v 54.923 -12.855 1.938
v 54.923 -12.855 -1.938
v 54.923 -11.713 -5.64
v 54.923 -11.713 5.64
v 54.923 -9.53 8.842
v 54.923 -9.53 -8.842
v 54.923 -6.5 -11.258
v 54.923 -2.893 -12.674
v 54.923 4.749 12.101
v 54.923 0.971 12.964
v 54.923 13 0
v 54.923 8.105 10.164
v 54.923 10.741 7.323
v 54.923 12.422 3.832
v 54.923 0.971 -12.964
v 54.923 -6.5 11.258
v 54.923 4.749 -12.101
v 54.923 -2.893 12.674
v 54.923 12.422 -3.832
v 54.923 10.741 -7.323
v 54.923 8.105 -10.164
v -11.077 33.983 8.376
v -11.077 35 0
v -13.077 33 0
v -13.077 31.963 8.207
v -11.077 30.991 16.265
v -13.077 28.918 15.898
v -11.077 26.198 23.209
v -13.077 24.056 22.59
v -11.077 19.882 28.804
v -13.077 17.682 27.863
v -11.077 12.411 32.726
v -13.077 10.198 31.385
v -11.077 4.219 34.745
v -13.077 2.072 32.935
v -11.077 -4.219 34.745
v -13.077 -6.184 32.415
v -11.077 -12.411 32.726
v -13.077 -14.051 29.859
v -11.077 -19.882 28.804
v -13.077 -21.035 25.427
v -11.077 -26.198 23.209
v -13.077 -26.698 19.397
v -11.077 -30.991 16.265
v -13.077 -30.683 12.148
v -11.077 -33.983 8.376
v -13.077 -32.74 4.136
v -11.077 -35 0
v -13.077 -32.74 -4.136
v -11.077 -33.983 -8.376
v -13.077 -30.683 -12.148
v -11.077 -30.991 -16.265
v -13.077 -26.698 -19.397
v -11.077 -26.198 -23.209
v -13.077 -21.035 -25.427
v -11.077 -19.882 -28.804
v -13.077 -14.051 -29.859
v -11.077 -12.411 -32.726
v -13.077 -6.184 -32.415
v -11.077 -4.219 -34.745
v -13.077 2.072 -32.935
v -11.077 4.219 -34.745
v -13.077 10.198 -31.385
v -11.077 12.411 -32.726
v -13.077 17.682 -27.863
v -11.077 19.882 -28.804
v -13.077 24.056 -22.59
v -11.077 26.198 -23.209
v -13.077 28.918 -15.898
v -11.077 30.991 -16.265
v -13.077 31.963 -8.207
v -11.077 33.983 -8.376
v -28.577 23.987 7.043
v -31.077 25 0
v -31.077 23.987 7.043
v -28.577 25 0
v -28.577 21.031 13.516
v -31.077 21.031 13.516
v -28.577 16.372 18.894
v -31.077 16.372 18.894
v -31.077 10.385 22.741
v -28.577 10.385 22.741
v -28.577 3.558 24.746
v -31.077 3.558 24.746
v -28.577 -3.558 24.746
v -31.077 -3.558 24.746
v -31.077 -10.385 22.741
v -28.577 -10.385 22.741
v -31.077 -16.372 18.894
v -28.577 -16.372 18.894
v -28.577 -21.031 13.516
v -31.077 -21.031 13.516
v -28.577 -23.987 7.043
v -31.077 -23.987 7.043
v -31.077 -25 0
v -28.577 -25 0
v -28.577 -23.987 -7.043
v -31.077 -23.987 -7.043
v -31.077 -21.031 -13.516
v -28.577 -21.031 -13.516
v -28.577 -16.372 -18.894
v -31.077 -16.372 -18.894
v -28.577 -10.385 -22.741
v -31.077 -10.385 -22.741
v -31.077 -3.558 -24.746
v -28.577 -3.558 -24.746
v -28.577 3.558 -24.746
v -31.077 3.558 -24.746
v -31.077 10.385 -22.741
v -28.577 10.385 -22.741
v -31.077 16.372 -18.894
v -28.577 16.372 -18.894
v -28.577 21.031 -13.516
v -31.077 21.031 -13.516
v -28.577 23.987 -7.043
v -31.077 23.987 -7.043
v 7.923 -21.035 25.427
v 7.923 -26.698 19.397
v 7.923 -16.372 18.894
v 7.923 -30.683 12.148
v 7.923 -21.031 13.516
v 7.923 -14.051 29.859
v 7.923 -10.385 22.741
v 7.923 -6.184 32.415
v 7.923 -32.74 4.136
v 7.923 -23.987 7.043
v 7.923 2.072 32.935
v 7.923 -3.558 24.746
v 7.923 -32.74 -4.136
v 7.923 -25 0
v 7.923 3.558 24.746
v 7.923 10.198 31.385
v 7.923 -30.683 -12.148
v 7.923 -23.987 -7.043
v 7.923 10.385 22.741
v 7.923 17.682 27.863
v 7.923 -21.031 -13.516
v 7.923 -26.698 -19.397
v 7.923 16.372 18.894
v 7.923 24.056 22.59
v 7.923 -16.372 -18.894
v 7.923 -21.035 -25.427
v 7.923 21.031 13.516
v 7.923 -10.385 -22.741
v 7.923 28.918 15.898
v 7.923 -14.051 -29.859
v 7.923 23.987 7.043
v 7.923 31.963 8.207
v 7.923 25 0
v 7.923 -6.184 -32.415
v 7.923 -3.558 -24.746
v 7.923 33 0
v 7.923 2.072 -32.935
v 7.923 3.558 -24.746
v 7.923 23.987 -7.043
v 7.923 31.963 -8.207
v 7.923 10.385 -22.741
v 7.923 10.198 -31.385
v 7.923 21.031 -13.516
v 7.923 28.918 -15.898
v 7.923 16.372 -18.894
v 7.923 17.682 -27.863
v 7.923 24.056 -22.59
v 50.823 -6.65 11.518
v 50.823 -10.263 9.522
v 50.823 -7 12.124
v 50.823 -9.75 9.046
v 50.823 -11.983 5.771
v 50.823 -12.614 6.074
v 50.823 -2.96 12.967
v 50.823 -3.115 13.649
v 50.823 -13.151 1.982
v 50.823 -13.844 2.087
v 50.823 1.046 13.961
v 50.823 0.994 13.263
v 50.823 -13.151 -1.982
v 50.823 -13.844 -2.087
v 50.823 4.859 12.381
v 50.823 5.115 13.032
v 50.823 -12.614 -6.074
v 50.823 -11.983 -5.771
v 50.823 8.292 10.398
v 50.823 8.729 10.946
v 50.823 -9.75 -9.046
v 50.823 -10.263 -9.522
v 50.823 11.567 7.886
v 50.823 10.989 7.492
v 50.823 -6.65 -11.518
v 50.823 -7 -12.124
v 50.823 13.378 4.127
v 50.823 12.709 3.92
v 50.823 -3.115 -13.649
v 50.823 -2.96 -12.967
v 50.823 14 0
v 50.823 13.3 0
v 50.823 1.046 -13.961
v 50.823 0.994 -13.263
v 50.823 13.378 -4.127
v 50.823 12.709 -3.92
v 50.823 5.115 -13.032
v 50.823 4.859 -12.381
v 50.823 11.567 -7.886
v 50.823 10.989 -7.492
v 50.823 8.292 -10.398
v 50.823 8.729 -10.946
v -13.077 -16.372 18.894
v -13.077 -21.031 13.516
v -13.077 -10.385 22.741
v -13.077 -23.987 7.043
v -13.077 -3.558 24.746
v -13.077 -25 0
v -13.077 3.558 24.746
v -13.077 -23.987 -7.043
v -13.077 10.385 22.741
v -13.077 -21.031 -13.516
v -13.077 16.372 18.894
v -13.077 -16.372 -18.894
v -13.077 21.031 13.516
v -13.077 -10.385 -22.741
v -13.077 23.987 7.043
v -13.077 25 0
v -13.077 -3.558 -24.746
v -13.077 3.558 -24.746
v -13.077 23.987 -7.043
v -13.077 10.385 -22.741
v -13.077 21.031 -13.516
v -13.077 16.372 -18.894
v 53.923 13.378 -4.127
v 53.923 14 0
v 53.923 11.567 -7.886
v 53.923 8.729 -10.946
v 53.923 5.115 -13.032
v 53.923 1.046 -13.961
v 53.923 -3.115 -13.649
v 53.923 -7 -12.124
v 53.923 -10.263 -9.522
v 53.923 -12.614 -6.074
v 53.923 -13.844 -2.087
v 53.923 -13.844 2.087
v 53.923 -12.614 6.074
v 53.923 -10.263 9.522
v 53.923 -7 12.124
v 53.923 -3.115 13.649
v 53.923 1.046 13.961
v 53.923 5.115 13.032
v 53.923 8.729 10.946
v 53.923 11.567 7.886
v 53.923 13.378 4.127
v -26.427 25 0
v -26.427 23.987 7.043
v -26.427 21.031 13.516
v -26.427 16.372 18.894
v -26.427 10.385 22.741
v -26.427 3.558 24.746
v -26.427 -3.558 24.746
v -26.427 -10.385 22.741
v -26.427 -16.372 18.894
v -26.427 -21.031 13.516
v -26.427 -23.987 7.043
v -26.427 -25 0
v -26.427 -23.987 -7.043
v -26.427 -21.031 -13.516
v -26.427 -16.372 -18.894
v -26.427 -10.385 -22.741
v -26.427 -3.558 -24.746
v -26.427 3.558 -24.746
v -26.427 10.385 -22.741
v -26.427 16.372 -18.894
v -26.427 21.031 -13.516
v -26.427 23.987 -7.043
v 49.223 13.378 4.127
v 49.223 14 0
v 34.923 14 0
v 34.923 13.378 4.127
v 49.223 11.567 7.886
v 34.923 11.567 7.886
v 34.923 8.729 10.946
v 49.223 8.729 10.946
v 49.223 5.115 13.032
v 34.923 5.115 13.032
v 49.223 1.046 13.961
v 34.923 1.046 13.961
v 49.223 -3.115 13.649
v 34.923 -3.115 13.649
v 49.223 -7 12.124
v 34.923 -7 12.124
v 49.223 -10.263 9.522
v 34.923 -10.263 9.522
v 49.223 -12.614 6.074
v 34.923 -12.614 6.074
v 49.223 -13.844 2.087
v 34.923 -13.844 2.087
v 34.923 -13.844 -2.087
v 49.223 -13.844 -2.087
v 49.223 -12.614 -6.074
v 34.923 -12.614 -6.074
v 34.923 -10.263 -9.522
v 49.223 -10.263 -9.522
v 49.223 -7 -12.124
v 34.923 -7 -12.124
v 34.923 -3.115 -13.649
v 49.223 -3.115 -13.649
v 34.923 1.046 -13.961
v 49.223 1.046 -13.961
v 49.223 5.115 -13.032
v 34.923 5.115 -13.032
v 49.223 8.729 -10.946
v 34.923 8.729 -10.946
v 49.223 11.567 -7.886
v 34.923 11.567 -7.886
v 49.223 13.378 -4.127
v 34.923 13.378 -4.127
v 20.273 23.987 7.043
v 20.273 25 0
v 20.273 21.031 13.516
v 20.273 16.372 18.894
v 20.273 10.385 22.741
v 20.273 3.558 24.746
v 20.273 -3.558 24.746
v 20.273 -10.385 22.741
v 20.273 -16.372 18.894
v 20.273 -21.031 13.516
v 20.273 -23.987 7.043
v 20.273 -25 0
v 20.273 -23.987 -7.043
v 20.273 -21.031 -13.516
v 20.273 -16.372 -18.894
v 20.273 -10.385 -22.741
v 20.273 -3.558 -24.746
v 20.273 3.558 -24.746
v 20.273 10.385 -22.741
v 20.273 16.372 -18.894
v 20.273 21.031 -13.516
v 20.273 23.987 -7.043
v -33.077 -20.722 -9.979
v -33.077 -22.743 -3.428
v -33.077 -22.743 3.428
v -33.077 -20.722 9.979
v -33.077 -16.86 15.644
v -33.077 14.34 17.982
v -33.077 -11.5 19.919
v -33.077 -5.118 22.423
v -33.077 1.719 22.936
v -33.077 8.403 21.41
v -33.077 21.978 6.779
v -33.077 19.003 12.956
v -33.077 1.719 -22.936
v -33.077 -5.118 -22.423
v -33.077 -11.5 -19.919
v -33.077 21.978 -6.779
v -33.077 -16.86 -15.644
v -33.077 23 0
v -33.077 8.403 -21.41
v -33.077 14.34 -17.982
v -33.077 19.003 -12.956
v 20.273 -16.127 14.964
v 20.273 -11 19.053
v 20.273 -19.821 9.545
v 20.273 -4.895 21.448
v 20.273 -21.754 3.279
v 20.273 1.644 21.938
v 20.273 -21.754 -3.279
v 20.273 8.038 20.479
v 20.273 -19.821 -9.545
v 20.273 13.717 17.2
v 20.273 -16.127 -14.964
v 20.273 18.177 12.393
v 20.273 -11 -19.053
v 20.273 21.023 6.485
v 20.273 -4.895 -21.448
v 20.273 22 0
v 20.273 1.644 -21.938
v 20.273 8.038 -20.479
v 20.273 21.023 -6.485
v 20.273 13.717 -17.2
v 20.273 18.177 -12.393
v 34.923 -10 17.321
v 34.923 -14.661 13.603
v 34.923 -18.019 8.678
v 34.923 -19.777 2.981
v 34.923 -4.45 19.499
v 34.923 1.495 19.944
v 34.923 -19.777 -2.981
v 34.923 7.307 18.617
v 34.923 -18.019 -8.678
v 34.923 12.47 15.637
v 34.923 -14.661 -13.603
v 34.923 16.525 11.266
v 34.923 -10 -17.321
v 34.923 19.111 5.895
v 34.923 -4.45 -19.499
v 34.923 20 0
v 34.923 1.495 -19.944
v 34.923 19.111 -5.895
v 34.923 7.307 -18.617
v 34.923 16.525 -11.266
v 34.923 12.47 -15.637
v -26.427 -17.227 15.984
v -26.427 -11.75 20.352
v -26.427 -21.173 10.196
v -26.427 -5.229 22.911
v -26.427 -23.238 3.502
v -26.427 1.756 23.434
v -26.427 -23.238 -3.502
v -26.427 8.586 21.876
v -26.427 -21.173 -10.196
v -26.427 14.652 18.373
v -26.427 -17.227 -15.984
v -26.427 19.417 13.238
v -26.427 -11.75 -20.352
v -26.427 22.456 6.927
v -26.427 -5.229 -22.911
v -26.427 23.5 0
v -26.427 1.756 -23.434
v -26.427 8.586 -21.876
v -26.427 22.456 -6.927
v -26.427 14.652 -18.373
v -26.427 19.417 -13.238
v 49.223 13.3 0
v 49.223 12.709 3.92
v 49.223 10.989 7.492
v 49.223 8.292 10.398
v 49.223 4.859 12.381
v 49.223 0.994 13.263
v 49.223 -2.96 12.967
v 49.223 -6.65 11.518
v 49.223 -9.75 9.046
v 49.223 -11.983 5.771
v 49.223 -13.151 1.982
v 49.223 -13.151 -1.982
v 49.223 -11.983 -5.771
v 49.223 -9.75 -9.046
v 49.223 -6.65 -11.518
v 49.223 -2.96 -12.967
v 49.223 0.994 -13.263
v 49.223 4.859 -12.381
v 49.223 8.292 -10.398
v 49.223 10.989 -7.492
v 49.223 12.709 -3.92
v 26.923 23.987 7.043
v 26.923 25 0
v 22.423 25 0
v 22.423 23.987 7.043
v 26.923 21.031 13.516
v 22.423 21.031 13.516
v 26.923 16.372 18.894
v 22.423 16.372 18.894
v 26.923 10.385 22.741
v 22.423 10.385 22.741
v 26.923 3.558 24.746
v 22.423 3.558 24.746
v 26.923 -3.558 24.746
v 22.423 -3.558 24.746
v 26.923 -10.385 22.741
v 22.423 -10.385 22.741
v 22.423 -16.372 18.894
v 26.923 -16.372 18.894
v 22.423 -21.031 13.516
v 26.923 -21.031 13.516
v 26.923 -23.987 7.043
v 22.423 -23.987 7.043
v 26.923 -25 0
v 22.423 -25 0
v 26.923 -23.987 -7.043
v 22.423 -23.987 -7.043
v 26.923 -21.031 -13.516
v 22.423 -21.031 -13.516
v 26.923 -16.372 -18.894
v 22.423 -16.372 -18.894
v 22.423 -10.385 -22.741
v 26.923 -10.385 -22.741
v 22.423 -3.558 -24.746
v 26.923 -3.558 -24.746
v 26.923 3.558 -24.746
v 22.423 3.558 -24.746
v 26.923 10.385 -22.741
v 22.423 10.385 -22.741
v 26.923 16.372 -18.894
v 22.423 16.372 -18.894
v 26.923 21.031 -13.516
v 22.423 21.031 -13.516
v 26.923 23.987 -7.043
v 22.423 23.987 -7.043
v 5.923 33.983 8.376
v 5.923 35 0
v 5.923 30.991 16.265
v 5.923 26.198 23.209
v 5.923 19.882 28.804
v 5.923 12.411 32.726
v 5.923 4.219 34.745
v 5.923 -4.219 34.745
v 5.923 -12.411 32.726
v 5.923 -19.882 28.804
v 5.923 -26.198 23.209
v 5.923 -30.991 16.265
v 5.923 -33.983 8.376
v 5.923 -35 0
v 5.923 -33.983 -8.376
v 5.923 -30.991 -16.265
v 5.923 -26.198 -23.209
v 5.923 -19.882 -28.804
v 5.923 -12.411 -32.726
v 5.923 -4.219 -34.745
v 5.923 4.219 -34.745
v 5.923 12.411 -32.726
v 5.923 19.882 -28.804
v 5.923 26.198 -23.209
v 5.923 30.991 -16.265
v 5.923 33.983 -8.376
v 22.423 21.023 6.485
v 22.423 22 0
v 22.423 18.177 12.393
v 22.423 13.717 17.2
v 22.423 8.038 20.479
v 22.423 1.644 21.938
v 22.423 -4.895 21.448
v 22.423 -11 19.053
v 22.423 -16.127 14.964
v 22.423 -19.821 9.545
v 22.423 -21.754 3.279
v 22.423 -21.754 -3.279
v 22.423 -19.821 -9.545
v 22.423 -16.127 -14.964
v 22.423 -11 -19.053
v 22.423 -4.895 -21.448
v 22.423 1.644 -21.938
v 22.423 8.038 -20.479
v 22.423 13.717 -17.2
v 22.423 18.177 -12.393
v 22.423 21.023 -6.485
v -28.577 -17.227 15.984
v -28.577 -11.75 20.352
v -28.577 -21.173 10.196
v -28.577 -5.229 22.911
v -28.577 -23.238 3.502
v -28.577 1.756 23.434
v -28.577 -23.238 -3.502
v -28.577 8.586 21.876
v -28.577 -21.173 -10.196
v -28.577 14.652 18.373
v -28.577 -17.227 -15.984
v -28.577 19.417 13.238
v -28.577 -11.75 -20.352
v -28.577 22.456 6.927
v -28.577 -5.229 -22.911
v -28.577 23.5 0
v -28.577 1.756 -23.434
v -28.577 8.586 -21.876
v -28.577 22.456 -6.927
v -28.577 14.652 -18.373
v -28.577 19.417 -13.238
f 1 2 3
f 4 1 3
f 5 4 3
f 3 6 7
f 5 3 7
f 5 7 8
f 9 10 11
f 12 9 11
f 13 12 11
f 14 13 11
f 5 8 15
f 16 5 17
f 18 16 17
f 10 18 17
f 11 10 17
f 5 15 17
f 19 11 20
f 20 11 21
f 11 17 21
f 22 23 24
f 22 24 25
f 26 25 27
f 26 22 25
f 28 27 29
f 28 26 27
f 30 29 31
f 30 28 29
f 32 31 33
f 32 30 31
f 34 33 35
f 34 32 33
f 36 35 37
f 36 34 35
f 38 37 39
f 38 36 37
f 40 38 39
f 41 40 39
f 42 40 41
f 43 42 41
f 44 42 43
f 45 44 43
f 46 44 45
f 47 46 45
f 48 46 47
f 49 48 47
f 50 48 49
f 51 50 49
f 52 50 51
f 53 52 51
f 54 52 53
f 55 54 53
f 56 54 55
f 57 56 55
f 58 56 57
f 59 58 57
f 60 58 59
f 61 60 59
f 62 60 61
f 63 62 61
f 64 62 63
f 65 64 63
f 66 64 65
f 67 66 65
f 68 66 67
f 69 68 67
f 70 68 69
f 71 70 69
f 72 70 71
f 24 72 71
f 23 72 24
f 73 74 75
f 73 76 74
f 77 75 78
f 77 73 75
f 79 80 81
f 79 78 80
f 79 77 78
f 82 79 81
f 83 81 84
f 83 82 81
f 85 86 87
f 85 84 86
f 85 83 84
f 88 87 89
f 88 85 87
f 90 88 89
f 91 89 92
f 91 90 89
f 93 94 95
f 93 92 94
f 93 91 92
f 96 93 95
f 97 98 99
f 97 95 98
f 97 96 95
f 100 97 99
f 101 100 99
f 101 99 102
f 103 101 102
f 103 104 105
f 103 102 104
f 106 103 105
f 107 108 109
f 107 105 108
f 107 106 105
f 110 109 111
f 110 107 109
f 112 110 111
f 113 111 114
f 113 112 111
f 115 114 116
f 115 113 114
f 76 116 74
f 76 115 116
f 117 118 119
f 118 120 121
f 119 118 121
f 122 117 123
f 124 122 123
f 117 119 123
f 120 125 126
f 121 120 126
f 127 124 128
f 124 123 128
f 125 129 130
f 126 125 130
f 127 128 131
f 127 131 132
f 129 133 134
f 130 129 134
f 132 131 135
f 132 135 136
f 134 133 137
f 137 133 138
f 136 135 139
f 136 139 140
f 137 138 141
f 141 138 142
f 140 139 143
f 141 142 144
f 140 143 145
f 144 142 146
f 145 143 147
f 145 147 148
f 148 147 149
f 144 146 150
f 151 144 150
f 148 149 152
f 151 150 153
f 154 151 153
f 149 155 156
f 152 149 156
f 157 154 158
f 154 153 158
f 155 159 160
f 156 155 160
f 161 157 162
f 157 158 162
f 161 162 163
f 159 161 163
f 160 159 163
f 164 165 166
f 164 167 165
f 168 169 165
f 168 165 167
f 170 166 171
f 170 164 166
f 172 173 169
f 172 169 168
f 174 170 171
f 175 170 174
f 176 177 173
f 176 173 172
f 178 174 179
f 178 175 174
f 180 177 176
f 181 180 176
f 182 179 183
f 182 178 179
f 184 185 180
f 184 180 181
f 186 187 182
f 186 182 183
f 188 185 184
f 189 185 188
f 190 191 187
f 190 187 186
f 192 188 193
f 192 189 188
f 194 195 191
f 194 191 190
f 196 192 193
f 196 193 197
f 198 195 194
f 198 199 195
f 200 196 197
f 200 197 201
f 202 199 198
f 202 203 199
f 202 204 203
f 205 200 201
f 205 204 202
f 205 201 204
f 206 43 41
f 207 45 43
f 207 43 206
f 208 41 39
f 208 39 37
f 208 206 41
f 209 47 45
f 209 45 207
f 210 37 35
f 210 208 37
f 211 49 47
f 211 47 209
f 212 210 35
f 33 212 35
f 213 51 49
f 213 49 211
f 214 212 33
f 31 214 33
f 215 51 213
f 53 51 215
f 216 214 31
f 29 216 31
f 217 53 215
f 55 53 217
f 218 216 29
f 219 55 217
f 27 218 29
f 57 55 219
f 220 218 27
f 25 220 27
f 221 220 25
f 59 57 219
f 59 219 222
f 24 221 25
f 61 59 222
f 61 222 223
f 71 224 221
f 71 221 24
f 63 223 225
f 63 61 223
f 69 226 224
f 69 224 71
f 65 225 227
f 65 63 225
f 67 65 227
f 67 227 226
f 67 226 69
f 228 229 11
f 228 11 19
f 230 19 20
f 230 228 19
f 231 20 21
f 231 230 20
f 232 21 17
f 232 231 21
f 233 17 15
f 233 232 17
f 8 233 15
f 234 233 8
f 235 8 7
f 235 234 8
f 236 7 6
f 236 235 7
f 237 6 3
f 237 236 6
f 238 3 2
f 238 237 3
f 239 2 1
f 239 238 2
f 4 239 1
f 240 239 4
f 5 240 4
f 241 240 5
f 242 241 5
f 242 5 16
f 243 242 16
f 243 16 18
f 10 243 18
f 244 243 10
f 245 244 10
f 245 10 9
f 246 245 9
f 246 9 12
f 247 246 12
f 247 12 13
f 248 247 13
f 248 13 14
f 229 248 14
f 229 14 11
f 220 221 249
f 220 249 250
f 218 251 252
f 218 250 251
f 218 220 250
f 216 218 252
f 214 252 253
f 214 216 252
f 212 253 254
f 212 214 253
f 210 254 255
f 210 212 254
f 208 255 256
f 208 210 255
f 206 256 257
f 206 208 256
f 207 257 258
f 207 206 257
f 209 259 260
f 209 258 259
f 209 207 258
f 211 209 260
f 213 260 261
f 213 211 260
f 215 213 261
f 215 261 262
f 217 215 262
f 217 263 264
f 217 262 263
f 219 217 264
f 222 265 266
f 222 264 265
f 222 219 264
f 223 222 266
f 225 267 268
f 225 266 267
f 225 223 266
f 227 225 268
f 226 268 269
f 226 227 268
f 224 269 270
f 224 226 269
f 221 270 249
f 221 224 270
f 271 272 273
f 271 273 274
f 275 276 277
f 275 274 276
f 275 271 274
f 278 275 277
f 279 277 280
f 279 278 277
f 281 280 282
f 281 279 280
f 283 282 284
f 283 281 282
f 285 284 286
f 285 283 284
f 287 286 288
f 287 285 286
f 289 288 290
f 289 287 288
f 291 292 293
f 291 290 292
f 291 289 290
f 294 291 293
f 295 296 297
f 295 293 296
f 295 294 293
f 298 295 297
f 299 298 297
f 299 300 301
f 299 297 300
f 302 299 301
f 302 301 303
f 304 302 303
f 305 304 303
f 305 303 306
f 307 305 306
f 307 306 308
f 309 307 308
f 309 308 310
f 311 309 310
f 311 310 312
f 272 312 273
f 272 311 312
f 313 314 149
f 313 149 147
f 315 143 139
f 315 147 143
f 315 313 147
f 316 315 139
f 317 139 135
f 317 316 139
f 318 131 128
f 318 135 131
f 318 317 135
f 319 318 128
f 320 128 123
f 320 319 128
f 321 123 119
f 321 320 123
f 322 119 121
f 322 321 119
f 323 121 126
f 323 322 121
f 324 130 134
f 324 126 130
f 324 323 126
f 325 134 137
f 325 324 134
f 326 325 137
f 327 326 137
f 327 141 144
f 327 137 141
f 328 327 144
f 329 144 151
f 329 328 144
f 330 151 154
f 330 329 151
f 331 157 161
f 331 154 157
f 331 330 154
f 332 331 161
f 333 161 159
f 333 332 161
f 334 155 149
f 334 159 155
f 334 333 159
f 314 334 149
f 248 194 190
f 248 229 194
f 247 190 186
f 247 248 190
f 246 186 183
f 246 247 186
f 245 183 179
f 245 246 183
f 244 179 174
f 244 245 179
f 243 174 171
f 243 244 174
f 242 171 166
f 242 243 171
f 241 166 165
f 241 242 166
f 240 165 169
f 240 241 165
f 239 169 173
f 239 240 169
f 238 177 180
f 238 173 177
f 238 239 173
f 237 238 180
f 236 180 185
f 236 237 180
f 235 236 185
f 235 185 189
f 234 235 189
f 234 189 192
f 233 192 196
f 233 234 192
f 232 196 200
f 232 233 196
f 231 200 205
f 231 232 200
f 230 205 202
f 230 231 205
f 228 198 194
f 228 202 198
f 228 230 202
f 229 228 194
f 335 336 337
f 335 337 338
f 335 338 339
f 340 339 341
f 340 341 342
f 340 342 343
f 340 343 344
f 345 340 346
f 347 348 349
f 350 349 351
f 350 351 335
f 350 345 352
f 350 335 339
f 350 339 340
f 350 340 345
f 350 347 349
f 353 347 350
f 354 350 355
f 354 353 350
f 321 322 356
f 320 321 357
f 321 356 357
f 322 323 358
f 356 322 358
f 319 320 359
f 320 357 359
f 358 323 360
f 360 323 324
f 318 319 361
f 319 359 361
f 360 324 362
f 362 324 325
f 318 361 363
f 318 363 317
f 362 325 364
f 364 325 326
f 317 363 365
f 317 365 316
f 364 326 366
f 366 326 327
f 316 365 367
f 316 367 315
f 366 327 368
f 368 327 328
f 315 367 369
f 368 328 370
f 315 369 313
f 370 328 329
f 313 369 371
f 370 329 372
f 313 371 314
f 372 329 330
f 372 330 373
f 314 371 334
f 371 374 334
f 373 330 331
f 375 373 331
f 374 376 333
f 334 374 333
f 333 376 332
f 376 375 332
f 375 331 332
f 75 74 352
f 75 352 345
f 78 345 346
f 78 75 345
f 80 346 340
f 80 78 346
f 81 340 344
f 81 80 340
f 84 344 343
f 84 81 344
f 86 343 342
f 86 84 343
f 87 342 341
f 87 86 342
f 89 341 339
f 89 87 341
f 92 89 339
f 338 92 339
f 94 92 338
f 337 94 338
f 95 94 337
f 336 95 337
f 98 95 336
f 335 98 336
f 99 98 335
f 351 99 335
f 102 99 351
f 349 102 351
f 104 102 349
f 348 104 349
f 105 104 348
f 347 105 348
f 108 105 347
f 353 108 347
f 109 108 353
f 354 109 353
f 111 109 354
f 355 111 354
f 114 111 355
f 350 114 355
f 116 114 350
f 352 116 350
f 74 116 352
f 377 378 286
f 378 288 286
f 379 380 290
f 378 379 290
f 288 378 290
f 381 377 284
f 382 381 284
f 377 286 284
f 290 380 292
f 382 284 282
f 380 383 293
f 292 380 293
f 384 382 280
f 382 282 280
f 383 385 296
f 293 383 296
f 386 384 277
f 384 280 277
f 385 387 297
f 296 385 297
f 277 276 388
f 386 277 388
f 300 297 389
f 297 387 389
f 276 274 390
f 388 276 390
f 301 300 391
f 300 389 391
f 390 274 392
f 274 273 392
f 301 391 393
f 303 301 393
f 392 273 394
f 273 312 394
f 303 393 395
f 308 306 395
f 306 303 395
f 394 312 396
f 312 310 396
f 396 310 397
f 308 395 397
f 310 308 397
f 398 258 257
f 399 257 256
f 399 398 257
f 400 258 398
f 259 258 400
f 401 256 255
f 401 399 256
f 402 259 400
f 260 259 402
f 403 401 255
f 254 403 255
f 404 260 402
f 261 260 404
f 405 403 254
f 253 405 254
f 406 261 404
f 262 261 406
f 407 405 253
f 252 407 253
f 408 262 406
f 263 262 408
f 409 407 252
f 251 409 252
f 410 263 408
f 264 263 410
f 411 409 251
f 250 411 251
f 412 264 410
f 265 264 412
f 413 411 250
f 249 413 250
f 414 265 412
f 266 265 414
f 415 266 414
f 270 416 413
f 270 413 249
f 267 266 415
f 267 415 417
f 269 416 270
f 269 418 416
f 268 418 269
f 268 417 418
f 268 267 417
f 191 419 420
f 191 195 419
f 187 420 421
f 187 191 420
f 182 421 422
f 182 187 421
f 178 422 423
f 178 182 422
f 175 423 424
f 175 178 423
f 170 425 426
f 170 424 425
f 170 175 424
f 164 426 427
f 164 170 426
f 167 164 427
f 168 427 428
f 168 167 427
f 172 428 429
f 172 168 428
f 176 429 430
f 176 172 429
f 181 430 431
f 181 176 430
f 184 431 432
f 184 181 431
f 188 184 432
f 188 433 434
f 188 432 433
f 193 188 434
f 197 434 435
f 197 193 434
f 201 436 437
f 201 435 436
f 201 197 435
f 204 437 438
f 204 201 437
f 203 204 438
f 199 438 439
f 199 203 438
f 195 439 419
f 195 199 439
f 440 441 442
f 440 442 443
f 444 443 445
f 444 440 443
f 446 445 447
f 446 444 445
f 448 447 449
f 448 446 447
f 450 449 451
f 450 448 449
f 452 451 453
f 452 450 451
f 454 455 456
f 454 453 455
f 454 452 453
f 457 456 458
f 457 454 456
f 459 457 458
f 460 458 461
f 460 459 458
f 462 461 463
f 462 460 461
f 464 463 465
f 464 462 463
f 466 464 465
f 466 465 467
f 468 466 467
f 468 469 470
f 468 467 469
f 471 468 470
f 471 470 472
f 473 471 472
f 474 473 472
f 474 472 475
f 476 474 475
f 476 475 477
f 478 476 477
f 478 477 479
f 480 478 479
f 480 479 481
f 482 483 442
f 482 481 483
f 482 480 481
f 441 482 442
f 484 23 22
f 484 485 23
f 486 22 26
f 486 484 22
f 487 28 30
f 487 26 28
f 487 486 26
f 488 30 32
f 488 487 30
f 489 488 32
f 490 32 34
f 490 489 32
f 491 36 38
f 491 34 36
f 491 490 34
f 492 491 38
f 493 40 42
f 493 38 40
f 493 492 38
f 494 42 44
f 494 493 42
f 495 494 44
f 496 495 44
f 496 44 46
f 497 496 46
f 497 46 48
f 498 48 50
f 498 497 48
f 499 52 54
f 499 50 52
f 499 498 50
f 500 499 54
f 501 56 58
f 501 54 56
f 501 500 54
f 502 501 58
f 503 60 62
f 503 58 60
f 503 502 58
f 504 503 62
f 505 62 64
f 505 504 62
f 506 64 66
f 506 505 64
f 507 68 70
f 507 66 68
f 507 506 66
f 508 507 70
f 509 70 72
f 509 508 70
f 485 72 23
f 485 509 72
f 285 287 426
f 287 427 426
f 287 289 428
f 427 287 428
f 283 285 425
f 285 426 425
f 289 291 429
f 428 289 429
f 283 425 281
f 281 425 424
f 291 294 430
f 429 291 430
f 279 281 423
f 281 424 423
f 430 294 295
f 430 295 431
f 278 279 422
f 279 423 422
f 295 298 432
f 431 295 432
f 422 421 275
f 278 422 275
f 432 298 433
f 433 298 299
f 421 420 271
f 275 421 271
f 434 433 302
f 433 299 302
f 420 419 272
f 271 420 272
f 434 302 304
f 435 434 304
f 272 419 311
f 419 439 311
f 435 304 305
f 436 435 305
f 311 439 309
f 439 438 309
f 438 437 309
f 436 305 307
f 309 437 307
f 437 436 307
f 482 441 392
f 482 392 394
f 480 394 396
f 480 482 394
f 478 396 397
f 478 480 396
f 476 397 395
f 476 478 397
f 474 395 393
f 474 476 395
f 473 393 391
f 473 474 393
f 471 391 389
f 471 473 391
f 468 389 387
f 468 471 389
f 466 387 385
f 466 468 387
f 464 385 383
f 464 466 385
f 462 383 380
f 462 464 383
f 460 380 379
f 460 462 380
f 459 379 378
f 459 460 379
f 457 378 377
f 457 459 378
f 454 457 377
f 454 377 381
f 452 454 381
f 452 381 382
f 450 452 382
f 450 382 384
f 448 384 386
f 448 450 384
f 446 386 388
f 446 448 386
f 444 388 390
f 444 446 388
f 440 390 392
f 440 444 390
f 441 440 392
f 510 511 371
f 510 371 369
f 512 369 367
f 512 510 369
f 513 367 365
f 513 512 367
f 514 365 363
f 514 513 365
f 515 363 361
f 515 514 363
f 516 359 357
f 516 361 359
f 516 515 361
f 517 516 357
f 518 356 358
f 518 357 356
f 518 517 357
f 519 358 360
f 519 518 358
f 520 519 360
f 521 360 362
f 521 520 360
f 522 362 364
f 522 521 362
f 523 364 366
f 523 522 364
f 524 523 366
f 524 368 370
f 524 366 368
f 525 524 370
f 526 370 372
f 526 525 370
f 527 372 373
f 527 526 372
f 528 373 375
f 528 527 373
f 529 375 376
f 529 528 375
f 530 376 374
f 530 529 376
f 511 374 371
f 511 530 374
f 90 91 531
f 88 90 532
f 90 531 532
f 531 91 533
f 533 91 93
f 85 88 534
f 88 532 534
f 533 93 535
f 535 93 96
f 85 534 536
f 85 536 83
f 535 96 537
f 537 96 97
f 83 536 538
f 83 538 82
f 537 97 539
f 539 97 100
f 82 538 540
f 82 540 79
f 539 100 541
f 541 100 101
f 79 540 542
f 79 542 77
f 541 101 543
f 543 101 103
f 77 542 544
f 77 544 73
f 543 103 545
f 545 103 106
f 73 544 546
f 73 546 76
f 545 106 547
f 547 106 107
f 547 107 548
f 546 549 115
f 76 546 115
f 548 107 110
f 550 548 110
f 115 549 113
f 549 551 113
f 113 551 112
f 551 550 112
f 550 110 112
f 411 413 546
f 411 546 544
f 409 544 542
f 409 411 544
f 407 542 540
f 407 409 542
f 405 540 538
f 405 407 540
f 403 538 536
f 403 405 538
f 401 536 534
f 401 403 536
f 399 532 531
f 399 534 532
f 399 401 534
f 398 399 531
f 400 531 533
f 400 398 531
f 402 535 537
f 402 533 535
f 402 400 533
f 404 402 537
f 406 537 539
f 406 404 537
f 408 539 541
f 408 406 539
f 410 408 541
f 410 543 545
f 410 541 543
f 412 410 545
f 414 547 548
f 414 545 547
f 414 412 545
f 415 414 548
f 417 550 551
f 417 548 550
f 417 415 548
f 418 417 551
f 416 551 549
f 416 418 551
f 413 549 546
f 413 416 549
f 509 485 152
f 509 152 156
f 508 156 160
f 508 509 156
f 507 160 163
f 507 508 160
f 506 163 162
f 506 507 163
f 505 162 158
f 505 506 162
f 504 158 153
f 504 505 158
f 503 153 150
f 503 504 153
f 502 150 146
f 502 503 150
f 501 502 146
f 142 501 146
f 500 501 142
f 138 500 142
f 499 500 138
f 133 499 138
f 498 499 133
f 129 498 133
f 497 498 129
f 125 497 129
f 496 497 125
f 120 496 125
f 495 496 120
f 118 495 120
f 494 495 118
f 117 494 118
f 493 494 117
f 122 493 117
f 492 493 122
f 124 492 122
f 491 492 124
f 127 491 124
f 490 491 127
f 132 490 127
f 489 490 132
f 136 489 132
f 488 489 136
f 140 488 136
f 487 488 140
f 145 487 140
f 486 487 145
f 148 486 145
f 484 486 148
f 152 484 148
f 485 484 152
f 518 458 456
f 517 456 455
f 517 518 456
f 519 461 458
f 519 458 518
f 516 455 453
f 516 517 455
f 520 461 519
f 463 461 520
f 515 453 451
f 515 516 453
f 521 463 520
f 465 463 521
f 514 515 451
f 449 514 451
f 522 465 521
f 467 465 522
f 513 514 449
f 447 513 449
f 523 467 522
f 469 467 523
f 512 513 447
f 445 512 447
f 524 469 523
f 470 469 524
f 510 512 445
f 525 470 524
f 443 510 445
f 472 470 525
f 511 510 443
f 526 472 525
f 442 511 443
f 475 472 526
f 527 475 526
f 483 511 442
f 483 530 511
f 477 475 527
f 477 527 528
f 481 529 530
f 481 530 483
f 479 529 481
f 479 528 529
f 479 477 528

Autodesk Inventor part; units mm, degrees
ref_plane "YZ Plane" through (0, 0, 0) normal (1, 0, 0) x (0, 1, 0)
ref_plane "XZ Plane" through (0, 0, 0) normal (0, 1, 0) x (-1, 0, 0)
ref_plane "XY Plane" through (0, 0, 0) normal (0, 0, 1) x (1, 0, 0)
sketch "pierwsza_proba" plane through (0, 0, 0) normal (0, 0, 1) x (1, 0, 0)
  line L0 (-33.0769, 0) -> (-33.0769, 25)
  line L1 (-26.4269, 23.5) -> (-26.4269, 25)
  line L2 (-13.0769, 25) -> (-13.0769, 35)
  line L3 (-13.0769, 35) -> (7.9231, 35)
  line L4 (7.9231, 35) -> (7.9231, 25)
  line L5 (7.9231, 25) -> (20.2731, 25)
  line L6 (20.2731, 25) -> (20.2731, 22)
  line L7 (20.2731, 22) -> (22.4231, 22)
  line L8 (34.9231, 14) -> (49.2231, 14)
  line L9 (49.2231, 14) -> (49.2231, 13.3)
  line L10 (49.2231, 13.3) -> (50.8231, 13.3)
  line L11 (50.8231, 13.3) -> (50.8231, 14)
  line L12 (50.8231, 14) -> (54.9231, 14)
  line L13 (54.9231, 14) -> (54.9231, 0)
  line L14 (54.9231, 0) -> (-33.0769, 0)
  line L15 (-33.0769, 25) -> (-28.5769, 25)
  line L16 (-28.5769, 25) -> (-28.5769, 23.5)
  line L17 (-28.5769, 23.5) -> (-26.4269, 23.5)
  line L18 (-26.4269, 25) -> (-13.0769, 25)
  line L19 (22.4231, 22) -> (22.4231, 25)
  line L20 (22.4231, 25) -> (26.9231, 25)
  line L21 (34.9231, 14) -> (34.9231, 20)
  line L22 (34.9231, 20) -> (26.9231, 25)
  dimension "d6" = 88
  dimension "d7" = 5.7
  dimension "d12" = 20
  dimension "d13" = 6.65
  dimension "d14" = 70
  dimension "d15" = 50
  dimension "d16" = 47
  dimension "d18" = 28
  dimension "d19" = 26.6
  dimension "d22" = 2.15
  dimension "d23" = 2.15
  dimension "d24" = 44
  dimension "d25" = 28
  dimension "d26" = 28
  dimension "d27" = 1.6
  dimension "d28" = 50
  dimension "d42" = 34.65
  dimension "d43" = 47
  dimension "d44" = 20
  dimension "d45" = 40
revolve "Obrót1" add sketch "pierwsza_proba" angle 360 about axis through (54.9231, 0, 0) along (-1, 0, 0)
chamfer "Faza1" distance 2 angle 45 1 edges at (-33.0769, -25, 0) measured on face at (-33.0769, 2.955, -7.7918)
chamfer "Faza2" distance 2 angle 45 1 edges at (-13.0769, -35, 0) measured on face at (-13.0769, 31.3522, 2.6905)
chamfer "Faza3" distance 2 angle 45 1 edges at (7.9231, -35, 0) measured on face at (7.9231, 31.3522, 2.6905)
chamfer "Faza4" distance 1 angle 45 1 edges at (54.9231, -14, 0) measured on face at (54.9231, -0.0766, 3.7068)
properties part number "Bartosz_Zukowski_model_nr_8.ipj"
